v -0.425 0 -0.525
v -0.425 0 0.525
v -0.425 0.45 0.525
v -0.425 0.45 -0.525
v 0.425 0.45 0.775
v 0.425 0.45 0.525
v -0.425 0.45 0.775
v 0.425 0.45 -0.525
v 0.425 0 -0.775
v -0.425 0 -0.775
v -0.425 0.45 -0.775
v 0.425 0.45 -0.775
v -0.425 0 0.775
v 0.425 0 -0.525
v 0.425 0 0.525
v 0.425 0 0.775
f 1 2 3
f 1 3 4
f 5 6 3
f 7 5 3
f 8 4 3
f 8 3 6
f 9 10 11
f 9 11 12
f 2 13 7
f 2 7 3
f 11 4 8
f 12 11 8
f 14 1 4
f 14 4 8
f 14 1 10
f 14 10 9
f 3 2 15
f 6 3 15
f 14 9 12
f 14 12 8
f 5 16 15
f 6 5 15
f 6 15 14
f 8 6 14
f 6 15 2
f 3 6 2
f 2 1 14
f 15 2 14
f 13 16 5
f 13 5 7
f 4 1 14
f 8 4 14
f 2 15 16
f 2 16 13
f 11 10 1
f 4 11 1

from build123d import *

# Parameters (mm, degrees)
MAINBODYS_W     = 0.85
MAINBODYS_H     = 1.05
MAINBODY_DEPTH  = 0.45
LEFTBODYS_W     = 0.85
LEFTBODYS_H     = 0.25
LEFTBODY_DEPTH  = 0.45
RIGHTBODYS_W    = 0.85
RIGHTBODYS_H    = 0.25
RIGHTBODY_DEPTH = 0.45


with BuildPart() as part:
    # MainBodyS → MainBody (new body)
    with BuildSketch(Plane(origin=(0, 0, 0), x_dir=(1, 0, 0), z_dir=(0, 1, 0))):
        Rectangle(MAINBODYS_W, MAINBODYS_H)
    extrude(amount=MAINBODY_DEPTH)


with BuildPart() as body_2:
    # LeftBodyS → LeftBody (new body)
    with BuildSketch(Plane(origin=(0, 0, 0), x_dir=(-1, 0, 0), z_dir=(0, -1, 0))):
        with Locations((0, -0.65)):
            Rectangle(LEFTBODYS_W, LEFTBODYS_H)
    extrude(amount=-LEFTBODY_DEPTH)


with BuildPart() as body_3:
    # RightBodyS → RightBody (new body)
    with BuildSketch(Plane.XZ):
        with Locations((0, -0.65)):
            Rectangle(RIGHTBODYS_W, RIGHTBODYS_H)
    extrude(amount=-RIGHTBODY_DEPTH)


solid = Compound([part.part, body_2.part, body_3.part])
